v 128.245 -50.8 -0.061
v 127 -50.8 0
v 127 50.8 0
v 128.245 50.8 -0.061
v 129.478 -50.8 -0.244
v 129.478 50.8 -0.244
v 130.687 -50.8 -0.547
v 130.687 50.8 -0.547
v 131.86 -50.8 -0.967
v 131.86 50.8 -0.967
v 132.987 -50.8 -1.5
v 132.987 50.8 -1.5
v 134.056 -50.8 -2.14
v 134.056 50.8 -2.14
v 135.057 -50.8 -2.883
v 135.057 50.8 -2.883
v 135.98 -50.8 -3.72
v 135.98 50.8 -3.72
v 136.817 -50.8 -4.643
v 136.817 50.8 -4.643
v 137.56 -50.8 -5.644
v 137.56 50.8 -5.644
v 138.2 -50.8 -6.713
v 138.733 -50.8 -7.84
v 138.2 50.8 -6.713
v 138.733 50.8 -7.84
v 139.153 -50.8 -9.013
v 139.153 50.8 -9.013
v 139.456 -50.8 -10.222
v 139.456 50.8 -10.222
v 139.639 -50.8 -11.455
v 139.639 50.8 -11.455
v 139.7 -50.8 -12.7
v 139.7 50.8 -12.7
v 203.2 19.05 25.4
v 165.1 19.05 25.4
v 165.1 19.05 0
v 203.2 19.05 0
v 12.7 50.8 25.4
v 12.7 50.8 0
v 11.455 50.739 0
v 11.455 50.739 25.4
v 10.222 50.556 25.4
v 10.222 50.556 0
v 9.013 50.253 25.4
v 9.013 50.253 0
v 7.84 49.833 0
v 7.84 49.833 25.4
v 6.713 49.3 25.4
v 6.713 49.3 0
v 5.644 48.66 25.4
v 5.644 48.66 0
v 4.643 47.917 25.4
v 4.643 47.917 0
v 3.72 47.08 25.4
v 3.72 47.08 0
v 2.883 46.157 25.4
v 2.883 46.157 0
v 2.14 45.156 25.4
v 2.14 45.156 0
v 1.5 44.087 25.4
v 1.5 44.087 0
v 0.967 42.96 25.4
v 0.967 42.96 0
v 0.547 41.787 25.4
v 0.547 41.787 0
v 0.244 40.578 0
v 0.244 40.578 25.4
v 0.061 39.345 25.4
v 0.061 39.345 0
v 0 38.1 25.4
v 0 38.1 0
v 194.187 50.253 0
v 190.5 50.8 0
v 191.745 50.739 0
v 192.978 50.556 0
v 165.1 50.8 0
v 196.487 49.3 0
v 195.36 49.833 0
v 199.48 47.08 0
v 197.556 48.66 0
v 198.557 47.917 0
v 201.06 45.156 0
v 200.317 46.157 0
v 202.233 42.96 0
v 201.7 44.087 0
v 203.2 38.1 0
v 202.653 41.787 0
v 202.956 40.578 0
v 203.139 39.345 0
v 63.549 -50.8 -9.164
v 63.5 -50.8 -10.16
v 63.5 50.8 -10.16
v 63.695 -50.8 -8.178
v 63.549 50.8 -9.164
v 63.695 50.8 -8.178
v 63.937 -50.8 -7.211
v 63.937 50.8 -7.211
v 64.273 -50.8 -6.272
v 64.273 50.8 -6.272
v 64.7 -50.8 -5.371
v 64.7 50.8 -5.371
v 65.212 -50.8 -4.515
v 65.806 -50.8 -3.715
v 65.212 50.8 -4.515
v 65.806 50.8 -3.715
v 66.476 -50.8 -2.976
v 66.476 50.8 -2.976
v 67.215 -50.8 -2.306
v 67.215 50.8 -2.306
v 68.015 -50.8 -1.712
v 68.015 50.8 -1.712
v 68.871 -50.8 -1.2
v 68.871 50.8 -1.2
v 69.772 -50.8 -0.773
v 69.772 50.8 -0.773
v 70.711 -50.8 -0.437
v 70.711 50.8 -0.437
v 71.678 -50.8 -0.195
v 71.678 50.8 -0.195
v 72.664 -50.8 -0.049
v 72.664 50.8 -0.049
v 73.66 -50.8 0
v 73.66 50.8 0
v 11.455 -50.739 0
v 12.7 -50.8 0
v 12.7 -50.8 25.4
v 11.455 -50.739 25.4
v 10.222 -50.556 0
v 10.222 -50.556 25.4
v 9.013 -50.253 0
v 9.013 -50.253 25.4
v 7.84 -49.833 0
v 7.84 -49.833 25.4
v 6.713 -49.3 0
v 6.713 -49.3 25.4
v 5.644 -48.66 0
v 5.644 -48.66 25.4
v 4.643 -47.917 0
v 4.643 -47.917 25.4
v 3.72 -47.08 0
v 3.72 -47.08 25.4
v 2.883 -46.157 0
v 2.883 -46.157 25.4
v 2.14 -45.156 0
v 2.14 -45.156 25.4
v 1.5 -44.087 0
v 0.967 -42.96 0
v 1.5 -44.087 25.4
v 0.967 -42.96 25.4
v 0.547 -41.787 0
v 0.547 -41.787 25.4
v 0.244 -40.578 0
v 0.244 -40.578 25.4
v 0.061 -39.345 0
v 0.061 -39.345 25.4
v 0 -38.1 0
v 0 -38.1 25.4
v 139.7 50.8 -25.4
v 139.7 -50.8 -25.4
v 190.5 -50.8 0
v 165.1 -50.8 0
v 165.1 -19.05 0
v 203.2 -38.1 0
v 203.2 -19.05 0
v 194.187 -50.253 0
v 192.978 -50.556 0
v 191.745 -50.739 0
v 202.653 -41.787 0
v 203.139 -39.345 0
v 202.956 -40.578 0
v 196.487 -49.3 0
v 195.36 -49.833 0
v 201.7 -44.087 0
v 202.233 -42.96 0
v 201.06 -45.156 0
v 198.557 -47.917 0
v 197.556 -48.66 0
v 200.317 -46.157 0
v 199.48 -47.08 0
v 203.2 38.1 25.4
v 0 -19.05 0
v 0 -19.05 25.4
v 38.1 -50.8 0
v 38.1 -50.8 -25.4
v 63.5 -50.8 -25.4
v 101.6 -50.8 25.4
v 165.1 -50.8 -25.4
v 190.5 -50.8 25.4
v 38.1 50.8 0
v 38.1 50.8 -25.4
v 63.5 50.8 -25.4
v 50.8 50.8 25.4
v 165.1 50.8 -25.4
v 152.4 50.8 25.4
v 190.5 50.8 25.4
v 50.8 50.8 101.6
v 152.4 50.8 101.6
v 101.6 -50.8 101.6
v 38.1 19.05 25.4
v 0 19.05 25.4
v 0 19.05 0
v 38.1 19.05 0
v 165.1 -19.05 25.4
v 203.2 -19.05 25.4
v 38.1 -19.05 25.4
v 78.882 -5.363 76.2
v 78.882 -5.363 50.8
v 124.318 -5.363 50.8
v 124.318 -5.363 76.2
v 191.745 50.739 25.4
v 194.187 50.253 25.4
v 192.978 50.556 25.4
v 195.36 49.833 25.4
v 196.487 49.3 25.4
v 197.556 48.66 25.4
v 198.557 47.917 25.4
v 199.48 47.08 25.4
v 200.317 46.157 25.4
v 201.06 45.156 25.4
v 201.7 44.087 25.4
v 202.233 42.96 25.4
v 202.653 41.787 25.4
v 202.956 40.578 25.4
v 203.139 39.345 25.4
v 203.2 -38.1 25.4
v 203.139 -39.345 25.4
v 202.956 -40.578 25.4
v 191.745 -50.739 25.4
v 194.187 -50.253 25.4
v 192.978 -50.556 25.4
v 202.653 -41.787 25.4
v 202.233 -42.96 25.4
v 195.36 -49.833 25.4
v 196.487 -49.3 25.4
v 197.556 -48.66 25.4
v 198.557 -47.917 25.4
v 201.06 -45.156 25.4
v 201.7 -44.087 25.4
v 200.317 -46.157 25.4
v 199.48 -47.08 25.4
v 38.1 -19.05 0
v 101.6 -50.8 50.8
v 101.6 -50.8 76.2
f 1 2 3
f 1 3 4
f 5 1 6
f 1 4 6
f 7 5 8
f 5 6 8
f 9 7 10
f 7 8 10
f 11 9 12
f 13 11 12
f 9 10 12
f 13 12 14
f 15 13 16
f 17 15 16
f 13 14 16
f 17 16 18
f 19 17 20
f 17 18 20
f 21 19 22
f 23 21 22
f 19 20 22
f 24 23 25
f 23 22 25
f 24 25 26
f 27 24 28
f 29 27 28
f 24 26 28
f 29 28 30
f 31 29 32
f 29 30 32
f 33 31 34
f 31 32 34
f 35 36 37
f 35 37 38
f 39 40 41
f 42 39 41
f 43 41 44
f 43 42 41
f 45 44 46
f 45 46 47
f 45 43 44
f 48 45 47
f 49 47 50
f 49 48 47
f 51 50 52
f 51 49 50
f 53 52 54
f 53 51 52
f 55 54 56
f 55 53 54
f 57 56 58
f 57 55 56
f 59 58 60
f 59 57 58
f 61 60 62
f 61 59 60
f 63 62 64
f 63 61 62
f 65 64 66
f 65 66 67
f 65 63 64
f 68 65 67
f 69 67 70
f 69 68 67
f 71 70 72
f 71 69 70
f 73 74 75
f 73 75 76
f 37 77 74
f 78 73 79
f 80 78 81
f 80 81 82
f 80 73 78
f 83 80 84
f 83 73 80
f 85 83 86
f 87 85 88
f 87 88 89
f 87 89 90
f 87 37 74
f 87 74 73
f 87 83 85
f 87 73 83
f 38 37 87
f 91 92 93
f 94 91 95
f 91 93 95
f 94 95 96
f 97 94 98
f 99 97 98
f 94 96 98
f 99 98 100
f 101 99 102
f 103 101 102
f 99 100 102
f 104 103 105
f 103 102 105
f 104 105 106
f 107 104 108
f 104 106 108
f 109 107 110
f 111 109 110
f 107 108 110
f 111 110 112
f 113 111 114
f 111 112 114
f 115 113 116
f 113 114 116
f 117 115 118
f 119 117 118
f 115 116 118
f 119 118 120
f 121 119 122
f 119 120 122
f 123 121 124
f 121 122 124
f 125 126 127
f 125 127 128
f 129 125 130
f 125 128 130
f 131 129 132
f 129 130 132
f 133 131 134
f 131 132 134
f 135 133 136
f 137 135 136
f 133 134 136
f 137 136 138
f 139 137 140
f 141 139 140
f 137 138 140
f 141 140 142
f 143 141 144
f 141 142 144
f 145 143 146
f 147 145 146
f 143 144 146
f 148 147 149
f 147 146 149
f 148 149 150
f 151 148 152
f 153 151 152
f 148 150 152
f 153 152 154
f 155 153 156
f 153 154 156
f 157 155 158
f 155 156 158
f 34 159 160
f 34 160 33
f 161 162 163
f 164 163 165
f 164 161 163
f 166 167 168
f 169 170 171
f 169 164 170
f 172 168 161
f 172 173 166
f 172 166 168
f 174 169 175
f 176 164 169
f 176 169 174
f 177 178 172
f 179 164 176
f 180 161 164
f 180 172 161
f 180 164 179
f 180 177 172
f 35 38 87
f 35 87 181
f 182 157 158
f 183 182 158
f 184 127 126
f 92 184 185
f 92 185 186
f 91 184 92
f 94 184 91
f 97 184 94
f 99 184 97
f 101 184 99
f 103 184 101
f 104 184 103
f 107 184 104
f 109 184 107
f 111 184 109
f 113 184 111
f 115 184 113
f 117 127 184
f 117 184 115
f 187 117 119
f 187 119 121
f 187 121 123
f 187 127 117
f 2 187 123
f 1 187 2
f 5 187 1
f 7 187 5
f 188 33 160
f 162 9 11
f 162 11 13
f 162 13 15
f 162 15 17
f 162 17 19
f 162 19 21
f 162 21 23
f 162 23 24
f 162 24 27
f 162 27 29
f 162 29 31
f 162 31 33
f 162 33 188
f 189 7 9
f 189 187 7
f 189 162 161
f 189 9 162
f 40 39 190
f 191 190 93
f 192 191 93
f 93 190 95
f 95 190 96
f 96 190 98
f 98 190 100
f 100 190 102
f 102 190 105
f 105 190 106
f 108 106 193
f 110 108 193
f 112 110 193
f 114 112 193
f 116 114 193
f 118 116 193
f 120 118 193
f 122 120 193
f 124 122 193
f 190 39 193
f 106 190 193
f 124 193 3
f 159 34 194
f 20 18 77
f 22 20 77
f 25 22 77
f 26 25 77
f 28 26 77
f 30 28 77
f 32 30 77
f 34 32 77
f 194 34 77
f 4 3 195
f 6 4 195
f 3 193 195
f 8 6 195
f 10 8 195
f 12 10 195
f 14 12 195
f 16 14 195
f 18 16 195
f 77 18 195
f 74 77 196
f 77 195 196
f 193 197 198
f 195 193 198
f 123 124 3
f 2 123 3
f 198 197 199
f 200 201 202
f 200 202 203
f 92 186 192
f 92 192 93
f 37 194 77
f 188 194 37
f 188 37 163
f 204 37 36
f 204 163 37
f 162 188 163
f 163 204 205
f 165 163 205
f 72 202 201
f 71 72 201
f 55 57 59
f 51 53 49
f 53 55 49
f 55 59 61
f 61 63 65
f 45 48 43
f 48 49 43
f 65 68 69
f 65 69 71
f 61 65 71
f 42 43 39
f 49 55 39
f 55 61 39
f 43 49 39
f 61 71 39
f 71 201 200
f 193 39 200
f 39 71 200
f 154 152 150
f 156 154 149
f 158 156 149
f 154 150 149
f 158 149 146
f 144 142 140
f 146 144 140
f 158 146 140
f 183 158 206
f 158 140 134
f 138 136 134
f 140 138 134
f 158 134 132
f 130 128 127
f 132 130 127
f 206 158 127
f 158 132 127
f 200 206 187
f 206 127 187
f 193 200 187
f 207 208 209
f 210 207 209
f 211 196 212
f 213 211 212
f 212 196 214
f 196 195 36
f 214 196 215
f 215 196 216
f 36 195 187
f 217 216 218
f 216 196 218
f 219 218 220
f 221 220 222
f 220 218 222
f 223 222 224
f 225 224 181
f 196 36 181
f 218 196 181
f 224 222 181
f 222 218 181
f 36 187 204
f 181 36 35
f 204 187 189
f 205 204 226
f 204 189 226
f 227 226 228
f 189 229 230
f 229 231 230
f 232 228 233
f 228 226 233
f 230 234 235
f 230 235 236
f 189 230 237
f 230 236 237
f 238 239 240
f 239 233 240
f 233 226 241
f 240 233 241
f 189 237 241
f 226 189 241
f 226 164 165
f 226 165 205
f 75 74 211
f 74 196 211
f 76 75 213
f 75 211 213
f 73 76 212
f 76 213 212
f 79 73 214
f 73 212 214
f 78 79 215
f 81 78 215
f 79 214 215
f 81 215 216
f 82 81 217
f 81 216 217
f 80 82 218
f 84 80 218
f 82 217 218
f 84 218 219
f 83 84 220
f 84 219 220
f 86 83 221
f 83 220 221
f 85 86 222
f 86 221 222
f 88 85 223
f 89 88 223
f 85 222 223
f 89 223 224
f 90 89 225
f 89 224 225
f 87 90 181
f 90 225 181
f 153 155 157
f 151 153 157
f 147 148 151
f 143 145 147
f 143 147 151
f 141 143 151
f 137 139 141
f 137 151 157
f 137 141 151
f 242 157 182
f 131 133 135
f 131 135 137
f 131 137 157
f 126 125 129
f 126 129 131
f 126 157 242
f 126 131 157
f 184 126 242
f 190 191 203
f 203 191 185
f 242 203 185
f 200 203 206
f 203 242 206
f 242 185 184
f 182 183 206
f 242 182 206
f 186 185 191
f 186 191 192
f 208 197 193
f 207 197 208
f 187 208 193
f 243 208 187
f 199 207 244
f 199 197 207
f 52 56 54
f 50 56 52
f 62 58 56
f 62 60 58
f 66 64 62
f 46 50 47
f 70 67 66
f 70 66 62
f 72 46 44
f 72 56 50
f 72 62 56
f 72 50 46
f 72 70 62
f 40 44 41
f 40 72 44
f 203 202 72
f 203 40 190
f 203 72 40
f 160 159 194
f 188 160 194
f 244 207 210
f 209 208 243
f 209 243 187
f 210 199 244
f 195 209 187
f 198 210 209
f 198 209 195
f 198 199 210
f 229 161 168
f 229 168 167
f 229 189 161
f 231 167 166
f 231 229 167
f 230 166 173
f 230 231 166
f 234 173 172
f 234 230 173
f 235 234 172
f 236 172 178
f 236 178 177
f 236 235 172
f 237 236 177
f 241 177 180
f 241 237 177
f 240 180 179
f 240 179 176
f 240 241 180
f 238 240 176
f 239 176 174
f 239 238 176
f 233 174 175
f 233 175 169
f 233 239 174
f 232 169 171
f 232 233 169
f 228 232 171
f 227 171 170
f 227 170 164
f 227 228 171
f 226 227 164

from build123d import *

# Parameters (mm, degrees)
F0_W      = 203.2
F0_H      = 25.4
F1_DEPTH  = 50.8
F3_DEPTH  = 25.4
F5_DEPTH  = 50.8
F7_DEPTH  = 25.4
F8_W      = 38.1
F8_H      = 38.1
F9_DEPTH  = 25.401
F10_R     = 12.7
F11_W     = 127
F11_H     = 25.4
F12_DEPTH = 101.6
F13_W     = 76.2
F13_H     = 25.4
F14_DEPTH = 101.601
F15_R     = 10.16
F16_R     = 12.7


with BuildPart() as f1:
    # F0 (on Front) → F1 (new body, symmetric)
    with BuildSketch(Plane.XZ):
        with Locations((101.6, 12.7)):
            Rectangle(F0_W, F0_H)
    extrude(amount=F1_DEPTH, both=True)

    # F2 (on face) → F3 (join)
    with BuildSketch(Plane.XY.offset(25.4)):
        Polygon((50.8, 50.8), (101.6, -50.8), (152.4, 50.8), align=None)
    extrude(amount=F3_DEPTH)

    # F4 (on face) → F5 (join)
    with BuildSketch(Plane.XY.offset(50.8)):
        Polygon((50.8, 50.8), (78.8815493486, -5.3630986972), (124.3184506514, -5.3630986972), (152.4, 50.8), align=None)
    extrude(amount=F5_DEPTH)

    # F6 (on face) → F7 (join)
    with BuildSketch(Plane.XY.offset(101.6)):
        Polygon((124.3184506514, -5.3630986972), (78.8815493486, -5.3630986972), (101.6, -50.8), align=None)
        Polygon((50.8, 50.8), (78.8815493486, -5.3630986972), (124.3184506514, -5.3630986972), (152.4, 50.8), align=None)
    extrude(amount=-F7_DEPTH)

    # F8 (on face) → F9 (cut, through all)
    with BuildSketch(Plane.XY.offset(25.4)):
        with Locations((19.05, 0)):
            Rectangle(F8_W, F8_H)
        with Locations((184.15, 0)):
            Rectangle(F8_W, F8_H)
    extrude(amount=-F9_DEPTH, mode=Mode.SUBTRACT)

    # F10
    f10_edges = [f1.edges().sort_by_distance(p)[0] for p in [
        (0, 50.8, 12.7),
        (0, -50.8, 12.7),
        (203.2, -50.8, 12.7),
        (203.2, 50.8, 12.7),
    ]]
    fillet(f10_edges, radius=F10_R)

    # F11 (on face) → F12 (join, through all)
    with BuildSketch(Plane.XZ.offset(50.8)):
        with Locations((101.6, -12.7)):
            Rectangle(F11_W, F11_H)
    extrude(amount=-F12_DEPTH)

    # F13 (on face) → F14 (cut, through all)
    with BuildSketch(Plane.XZ.offset(50.8)):
        with Locations((101.6, -12.7)):
            Rectangle(F13_W, F13_H)
    extrude(amount=-F14_DEPTH, mode=Mode.SUBTRACT)

    # F15
    f15_edges = [f1.edges().sort_by_distance(p)[0] for p in [
        (63.5, 0, 0),
    ]]
    fillet(f15_edges, radius=F15_R)

    # F16
    f16_edges = [f1.edges().sort_by_distance(p)[0] for p in [
        (139.7, 0, 0),
    ]]
    fillet(f16_edges, radius=F16_R)


solid = f1.part
